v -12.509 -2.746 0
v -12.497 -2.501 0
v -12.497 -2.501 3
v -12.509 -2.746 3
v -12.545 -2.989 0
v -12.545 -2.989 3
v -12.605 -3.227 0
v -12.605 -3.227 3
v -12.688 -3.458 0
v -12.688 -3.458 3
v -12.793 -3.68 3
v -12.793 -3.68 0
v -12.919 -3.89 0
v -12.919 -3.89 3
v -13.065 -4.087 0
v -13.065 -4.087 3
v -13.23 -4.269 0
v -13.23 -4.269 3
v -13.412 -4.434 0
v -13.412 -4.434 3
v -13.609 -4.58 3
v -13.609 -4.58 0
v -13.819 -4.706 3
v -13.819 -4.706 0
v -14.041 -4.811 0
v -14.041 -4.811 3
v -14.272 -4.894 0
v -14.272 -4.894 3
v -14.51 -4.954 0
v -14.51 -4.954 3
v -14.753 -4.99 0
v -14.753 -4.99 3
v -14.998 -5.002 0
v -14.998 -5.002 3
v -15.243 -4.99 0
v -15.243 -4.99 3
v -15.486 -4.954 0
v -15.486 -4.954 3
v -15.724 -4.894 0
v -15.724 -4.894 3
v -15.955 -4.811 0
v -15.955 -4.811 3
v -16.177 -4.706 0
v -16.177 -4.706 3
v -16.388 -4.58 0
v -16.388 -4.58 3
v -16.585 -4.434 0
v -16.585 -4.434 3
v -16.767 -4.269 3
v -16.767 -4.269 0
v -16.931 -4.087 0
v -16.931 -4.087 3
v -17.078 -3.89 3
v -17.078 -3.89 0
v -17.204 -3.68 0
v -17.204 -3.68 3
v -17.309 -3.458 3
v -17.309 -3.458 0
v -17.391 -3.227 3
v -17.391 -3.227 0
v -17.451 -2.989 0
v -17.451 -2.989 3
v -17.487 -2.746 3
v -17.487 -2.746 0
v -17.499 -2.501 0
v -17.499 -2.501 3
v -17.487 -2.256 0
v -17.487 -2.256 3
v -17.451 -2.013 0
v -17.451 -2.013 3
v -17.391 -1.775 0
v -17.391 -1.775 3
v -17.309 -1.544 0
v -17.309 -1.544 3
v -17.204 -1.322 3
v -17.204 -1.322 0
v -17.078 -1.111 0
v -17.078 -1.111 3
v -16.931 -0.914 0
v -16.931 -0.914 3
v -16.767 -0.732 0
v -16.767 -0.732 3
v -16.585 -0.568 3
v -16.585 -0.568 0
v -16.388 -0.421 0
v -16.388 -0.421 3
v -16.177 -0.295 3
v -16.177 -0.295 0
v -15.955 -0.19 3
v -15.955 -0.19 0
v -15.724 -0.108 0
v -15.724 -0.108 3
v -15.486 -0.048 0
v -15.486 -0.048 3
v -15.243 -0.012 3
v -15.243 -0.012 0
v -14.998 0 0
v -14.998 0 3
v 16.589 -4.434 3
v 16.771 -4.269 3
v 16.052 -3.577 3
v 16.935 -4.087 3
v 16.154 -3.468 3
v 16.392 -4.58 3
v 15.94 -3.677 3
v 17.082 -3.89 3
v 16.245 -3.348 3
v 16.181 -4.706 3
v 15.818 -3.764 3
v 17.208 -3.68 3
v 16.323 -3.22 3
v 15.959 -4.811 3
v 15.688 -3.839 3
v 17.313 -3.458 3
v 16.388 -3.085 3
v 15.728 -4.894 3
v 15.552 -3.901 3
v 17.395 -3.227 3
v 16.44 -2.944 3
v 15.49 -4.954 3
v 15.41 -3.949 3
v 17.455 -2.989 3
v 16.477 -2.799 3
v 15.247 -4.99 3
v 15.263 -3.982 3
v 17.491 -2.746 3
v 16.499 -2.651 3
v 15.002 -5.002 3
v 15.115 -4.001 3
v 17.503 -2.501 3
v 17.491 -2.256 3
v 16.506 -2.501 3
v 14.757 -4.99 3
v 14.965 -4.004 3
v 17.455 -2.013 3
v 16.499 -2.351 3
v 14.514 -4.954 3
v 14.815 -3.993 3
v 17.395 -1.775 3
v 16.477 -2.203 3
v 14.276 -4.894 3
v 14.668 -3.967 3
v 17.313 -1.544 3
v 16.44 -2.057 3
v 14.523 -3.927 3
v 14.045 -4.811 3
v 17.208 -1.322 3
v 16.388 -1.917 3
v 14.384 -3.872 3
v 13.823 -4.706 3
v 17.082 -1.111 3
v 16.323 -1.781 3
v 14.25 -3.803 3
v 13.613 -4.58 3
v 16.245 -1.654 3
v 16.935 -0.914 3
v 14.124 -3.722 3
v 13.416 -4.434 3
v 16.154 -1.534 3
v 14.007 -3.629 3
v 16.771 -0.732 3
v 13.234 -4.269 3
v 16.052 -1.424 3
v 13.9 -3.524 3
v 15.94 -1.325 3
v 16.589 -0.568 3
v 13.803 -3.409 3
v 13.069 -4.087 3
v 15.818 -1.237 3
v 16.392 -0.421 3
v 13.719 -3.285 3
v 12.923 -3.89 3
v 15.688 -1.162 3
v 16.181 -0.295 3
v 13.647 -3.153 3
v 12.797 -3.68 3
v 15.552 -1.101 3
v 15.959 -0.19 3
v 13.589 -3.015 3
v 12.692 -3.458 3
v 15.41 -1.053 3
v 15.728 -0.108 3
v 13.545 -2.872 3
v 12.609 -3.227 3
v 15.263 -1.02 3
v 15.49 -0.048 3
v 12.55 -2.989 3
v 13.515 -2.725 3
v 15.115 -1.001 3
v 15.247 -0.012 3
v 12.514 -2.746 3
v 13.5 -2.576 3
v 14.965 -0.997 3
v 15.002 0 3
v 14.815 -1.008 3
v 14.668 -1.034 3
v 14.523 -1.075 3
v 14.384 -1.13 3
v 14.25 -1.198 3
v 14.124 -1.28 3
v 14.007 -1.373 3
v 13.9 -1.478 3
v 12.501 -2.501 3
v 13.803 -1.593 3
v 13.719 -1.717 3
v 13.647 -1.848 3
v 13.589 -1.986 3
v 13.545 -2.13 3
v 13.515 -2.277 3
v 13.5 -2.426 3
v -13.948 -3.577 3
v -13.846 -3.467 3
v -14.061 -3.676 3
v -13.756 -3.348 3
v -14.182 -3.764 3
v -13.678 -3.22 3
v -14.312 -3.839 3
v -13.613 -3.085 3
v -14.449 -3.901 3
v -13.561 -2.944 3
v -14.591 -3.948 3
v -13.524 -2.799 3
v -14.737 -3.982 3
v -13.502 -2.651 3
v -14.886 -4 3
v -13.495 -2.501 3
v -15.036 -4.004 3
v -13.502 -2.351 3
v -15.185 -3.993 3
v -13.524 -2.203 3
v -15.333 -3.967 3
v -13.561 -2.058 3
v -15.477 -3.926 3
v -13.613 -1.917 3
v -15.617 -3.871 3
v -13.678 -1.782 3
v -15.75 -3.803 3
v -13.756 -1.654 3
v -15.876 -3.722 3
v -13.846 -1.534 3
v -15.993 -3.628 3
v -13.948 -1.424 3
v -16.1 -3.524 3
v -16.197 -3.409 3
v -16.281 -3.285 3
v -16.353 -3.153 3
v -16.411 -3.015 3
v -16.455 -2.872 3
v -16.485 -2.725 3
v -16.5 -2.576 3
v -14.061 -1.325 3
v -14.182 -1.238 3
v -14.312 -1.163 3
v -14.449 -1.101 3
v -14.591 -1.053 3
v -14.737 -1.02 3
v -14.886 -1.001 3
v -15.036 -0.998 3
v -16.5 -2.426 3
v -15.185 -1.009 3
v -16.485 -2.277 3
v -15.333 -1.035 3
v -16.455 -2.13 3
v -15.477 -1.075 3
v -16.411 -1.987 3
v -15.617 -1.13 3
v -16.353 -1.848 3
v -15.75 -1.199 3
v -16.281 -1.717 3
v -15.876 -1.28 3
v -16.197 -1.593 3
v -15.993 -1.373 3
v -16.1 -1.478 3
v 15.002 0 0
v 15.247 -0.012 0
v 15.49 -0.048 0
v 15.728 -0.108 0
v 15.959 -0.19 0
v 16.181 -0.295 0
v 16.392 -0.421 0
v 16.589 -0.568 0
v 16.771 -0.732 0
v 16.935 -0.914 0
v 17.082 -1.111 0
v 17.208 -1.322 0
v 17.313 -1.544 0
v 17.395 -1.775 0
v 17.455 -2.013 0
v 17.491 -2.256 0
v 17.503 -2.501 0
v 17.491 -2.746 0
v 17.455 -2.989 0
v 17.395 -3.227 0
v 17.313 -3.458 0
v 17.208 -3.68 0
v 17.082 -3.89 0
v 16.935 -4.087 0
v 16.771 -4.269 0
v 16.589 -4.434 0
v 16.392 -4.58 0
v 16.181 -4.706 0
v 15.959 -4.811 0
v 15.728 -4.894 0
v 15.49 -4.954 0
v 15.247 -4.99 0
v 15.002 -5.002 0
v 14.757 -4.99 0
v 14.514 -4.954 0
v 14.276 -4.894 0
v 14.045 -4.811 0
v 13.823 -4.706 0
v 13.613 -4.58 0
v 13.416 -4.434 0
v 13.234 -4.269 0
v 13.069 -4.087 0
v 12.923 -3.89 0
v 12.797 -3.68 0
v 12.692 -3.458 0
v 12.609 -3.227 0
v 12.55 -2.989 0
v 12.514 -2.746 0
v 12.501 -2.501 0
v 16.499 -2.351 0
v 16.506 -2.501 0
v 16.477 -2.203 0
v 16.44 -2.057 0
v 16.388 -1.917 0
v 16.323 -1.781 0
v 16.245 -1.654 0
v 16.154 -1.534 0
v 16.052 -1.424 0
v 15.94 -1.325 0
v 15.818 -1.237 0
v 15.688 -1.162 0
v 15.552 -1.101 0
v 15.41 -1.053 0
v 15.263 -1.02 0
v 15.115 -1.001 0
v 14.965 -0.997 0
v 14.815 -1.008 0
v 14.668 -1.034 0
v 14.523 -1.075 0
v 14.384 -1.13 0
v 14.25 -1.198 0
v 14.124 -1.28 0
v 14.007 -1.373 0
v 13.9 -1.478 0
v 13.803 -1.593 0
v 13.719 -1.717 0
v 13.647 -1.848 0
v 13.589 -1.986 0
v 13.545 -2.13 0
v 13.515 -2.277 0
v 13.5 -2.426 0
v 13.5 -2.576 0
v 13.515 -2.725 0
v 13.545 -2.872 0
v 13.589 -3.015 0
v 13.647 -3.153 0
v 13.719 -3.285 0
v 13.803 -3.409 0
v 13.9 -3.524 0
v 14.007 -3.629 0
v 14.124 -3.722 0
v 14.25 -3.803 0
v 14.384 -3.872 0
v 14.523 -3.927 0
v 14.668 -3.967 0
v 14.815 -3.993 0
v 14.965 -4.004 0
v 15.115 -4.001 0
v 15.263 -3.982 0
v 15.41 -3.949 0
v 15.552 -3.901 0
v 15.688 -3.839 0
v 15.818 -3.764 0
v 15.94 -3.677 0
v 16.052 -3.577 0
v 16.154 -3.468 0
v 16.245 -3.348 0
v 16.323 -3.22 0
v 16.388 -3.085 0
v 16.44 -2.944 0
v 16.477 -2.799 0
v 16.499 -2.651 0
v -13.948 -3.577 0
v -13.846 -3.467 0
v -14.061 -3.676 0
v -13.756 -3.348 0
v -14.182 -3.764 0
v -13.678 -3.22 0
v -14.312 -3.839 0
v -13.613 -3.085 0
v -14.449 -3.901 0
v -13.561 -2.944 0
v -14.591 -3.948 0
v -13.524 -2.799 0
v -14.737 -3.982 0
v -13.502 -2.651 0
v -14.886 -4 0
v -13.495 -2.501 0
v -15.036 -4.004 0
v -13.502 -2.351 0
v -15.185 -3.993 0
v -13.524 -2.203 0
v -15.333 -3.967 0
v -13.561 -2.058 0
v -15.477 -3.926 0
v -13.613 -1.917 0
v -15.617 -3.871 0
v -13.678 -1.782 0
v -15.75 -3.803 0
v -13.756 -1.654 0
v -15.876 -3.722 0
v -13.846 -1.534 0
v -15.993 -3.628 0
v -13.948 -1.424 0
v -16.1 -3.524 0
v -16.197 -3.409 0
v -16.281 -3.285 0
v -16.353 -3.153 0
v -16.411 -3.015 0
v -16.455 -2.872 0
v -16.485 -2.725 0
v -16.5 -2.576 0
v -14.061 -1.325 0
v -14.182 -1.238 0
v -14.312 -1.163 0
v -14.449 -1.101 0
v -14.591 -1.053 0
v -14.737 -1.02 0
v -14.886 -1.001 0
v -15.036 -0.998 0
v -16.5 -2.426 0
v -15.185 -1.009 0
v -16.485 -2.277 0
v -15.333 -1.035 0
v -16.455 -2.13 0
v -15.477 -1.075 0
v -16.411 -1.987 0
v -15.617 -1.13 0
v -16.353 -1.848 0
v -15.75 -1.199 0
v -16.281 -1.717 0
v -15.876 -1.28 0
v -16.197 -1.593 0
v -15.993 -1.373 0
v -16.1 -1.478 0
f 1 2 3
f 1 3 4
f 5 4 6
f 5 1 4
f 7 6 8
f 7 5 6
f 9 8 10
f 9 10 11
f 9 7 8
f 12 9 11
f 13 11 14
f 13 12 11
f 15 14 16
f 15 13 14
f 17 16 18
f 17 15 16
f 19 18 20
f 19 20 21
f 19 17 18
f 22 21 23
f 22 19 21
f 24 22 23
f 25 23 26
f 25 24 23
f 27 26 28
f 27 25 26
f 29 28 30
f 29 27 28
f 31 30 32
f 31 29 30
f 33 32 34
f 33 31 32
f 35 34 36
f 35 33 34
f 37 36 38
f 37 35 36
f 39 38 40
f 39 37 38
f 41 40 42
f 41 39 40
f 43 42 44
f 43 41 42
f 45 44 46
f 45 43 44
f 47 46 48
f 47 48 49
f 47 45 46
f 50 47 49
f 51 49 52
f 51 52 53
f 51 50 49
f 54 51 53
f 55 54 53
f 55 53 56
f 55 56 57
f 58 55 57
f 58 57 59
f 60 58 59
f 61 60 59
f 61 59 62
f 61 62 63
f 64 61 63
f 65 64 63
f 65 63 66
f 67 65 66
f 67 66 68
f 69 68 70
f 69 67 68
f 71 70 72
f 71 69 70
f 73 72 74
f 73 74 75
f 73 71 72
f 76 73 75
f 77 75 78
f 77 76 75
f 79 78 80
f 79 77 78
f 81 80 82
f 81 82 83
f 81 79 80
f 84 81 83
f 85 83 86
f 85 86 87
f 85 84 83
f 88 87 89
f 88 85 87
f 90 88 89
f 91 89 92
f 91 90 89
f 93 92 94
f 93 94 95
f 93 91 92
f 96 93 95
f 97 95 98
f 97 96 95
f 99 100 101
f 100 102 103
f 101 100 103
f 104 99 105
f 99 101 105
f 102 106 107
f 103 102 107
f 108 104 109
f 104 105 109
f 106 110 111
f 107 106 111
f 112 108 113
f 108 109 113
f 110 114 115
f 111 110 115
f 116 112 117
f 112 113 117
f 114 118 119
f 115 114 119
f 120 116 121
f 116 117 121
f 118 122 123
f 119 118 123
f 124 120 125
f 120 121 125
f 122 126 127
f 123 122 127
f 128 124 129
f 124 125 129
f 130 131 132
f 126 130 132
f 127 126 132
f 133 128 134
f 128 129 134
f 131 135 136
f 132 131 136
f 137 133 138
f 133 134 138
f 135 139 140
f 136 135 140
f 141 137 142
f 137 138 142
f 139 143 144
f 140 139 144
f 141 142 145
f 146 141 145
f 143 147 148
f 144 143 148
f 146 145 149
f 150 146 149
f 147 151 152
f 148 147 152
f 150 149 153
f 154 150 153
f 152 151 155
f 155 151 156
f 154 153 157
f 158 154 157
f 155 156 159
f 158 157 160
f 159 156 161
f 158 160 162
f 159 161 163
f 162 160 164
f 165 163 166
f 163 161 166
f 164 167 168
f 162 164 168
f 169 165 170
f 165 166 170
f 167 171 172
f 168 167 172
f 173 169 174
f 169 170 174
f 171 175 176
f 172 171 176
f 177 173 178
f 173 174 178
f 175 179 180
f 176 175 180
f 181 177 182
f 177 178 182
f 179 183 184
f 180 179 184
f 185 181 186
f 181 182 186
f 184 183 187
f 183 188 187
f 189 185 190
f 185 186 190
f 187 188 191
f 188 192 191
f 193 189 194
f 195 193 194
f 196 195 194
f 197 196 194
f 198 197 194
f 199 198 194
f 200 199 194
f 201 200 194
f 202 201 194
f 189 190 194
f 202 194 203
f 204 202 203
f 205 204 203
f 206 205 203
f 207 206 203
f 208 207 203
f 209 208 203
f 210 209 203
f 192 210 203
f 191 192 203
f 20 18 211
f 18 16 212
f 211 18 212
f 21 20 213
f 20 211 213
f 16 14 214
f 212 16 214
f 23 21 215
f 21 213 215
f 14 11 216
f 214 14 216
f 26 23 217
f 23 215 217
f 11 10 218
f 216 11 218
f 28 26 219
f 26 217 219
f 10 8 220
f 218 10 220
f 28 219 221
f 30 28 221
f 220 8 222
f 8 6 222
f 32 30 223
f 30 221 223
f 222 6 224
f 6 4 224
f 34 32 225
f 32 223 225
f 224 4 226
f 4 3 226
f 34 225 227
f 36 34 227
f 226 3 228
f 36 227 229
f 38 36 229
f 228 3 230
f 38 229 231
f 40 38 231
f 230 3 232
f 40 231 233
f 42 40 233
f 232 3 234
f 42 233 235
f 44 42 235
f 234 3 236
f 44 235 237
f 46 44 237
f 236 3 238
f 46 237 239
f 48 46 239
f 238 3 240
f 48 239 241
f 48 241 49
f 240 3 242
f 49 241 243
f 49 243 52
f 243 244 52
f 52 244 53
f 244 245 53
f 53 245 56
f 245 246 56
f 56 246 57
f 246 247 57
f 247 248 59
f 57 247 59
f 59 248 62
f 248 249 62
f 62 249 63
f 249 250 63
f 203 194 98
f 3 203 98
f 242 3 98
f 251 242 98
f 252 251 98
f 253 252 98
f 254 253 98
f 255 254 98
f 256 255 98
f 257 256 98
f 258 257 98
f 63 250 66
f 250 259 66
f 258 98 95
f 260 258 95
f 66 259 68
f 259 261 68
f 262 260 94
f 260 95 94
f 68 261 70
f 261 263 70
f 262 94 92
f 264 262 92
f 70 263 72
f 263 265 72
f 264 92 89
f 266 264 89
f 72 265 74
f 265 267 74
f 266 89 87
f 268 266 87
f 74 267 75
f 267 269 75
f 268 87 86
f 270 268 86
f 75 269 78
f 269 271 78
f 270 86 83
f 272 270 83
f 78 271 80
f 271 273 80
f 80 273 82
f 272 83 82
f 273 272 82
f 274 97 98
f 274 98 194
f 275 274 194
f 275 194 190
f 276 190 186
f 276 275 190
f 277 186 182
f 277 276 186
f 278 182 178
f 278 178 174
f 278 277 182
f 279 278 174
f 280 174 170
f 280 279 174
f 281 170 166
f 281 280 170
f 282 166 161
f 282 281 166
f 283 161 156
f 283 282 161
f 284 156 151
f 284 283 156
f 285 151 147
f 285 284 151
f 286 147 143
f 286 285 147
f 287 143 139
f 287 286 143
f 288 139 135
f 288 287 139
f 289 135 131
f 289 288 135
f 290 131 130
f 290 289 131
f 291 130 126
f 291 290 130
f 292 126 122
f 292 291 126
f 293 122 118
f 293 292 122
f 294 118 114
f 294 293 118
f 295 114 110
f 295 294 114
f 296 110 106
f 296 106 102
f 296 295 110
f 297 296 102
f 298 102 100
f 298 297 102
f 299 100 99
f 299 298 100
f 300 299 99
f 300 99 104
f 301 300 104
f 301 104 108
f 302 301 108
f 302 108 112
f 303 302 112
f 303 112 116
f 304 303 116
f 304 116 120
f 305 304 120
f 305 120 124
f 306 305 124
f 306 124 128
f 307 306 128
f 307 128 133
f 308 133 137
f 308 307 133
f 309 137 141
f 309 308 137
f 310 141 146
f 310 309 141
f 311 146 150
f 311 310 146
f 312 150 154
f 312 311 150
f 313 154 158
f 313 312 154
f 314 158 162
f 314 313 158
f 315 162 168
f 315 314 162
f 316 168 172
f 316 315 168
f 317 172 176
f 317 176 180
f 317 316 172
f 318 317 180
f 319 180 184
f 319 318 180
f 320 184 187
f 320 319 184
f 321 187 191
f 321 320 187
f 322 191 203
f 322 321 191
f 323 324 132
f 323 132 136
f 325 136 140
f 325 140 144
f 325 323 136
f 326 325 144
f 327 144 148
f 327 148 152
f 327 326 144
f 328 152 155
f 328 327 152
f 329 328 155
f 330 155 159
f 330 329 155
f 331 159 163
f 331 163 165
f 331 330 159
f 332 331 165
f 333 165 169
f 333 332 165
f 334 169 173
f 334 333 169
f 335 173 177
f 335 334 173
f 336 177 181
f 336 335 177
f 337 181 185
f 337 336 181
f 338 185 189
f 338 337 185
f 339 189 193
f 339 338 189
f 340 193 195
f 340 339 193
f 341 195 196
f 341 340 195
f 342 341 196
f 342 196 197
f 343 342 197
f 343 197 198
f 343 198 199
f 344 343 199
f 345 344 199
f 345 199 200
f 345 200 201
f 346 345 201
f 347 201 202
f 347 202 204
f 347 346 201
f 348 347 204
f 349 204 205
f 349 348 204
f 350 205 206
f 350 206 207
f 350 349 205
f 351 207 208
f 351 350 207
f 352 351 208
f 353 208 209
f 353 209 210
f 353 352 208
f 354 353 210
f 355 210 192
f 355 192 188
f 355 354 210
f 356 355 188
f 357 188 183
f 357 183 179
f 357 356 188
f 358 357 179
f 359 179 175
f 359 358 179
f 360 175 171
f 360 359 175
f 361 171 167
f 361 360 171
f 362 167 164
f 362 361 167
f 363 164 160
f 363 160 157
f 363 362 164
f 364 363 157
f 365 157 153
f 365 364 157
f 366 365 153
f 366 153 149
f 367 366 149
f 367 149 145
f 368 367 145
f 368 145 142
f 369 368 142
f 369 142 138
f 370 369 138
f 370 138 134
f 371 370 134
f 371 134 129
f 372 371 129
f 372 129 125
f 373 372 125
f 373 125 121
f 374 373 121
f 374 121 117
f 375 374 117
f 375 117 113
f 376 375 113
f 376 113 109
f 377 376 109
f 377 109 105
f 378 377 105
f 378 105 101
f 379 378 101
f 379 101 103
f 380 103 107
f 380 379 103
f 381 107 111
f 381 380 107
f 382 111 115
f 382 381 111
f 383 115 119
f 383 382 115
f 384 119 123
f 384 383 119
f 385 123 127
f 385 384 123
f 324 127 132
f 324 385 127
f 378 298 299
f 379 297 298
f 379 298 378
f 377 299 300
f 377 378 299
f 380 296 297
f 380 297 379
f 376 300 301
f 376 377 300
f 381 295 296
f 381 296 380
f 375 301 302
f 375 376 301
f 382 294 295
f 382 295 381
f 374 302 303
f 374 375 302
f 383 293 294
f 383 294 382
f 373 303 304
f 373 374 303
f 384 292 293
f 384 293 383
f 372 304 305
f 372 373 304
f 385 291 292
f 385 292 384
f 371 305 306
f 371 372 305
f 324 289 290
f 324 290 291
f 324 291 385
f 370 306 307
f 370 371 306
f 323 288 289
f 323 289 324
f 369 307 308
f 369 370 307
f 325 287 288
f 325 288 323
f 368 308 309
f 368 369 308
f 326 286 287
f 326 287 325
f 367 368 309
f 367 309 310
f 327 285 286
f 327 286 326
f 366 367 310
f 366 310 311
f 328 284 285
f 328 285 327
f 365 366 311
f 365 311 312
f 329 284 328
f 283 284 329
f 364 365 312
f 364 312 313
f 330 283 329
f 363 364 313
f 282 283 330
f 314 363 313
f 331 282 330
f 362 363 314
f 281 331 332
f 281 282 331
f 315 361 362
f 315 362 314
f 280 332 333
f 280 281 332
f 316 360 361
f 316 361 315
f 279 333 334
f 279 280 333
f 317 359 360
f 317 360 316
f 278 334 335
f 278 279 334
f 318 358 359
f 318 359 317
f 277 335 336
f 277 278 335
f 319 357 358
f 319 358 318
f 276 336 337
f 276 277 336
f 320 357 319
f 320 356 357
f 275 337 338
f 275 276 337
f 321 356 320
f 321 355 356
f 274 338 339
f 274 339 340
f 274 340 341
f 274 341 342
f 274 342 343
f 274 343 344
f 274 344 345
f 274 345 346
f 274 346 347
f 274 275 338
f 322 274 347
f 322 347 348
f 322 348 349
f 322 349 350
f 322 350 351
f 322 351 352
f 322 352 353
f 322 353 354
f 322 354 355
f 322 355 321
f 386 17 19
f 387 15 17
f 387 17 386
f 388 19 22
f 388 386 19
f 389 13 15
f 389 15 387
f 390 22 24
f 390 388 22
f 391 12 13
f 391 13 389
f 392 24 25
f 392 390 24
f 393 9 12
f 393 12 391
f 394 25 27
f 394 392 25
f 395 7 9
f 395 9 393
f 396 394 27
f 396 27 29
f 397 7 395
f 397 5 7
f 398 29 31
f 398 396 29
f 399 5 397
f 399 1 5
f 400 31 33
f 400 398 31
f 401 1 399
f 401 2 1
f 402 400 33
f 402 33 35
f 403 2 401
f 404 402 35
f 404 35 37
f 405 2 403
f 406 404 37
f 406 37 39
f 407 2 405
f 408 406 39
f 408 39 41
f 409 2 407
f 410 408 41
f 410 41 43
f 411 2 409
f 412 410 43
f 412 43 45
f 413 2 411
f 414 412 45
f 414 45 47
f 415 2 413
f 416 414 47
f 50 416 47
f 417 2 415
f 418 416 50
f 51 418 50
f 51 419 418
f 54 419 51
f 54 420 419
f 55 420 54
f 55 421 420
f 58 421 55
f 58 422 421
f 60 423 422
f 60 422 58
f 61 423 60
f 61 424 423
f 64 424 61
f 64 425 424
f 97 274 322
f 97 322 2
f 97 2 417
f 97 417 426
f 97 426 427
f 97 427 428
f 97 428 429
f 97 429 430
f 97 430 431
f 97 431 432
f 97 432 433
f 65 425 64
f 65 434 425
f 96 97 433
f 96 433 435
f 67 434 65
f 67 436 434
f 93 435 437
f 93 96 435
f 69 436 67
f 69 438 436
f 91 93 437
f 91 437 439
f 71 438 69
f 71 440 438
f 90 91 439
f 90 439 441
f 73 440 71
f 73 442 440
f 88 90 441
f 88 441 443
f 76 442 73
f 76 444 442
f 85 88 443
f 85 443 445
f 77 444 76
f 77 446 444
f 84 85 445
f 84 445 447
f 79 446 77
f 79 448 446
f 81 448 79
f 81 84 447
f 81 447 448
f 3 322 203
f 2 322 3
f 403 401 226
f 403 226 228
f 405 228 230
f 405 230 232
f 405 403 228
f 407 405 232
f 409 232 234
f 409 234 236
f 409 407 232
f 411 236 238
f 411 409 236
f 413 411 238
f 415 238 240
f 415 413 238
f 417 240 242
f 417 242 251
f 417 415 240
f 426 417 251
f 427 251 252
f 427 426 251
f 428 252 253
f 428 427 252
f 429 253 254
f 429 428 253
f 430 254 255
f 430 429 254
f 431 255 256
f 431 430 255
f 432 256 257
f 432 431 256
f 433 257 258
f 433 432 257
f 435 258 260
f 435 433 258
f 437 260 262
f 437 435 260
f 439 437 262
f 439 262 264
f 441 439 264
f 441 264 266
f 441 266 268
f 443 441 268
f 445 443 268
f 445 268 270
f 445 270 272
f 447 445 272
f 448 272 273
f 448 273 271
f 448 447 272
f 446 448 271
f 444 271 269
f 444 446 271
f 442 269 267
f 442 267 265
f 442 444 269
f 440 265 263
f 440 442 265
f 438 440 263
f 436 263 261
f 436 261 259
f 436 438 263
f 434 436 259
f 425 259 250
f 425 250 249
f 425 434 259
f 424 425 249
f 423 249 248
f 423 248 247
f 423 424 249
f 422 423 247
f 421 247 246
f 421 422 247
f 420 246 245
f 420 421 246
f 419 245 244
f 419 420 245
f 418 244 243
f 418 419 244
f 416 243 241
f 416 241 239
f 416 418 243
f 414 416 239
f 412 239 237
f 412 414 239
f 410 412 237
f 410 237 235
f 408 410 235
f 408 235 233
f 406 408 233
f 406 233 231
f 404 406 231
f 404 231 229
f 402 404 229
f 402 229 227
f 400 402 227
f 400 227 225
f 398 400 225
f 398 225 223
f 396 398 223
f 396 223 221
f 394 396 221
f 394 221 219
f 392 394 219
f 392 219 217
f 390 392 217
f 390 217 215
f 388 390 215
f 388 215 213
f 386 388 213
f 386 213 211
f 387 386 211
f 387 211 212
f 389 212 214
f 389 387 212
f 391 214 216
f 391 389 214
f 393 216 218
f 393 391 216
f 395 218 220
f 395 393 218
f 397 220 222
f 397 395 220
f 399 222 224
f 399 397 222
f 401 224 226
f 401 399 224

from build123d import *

# Parameters (mm, degrees)
SKETCH_1_R      = 1.503661285
SKETCH_1_R_2    = 1.504036587
EXTRUDE_1_DEPTH = 3


with BuildPart() as part:
    # 草图1 → 凸台-拉伸1 (new body)
    with BuildSketch(Plane.XY):
        with BuildLine():
            Line((0, 0), (15.002289805, 0))
            ThreePointArc((15.002289805, 0), (16.770627342, -4.269144464), (12.501482877, -2.500806927))
            Line((12.501482877, -2.500806927), (-12.497361882, -2.500806927))
            ThreePointArc((-12.497361882, -2.500806927), (-16.766506346, -4.269144464), (-14.998168809, 0))
            Line((-14.998168809, 0), (0, 0))
        make_face()
        with Locations((-14.998168809, -2.500806927)):
            Circle(SKETCH_1_R, mode=Mode.SUBTRACT)
        with Locations((15.002289805, -2.500806927)):
            Circle(SKETCH_1_R_2, mode=Mode.SUBTRACT)
    extrude(amount=EXTRUDE_1_DEPTH)


solid = part.part
